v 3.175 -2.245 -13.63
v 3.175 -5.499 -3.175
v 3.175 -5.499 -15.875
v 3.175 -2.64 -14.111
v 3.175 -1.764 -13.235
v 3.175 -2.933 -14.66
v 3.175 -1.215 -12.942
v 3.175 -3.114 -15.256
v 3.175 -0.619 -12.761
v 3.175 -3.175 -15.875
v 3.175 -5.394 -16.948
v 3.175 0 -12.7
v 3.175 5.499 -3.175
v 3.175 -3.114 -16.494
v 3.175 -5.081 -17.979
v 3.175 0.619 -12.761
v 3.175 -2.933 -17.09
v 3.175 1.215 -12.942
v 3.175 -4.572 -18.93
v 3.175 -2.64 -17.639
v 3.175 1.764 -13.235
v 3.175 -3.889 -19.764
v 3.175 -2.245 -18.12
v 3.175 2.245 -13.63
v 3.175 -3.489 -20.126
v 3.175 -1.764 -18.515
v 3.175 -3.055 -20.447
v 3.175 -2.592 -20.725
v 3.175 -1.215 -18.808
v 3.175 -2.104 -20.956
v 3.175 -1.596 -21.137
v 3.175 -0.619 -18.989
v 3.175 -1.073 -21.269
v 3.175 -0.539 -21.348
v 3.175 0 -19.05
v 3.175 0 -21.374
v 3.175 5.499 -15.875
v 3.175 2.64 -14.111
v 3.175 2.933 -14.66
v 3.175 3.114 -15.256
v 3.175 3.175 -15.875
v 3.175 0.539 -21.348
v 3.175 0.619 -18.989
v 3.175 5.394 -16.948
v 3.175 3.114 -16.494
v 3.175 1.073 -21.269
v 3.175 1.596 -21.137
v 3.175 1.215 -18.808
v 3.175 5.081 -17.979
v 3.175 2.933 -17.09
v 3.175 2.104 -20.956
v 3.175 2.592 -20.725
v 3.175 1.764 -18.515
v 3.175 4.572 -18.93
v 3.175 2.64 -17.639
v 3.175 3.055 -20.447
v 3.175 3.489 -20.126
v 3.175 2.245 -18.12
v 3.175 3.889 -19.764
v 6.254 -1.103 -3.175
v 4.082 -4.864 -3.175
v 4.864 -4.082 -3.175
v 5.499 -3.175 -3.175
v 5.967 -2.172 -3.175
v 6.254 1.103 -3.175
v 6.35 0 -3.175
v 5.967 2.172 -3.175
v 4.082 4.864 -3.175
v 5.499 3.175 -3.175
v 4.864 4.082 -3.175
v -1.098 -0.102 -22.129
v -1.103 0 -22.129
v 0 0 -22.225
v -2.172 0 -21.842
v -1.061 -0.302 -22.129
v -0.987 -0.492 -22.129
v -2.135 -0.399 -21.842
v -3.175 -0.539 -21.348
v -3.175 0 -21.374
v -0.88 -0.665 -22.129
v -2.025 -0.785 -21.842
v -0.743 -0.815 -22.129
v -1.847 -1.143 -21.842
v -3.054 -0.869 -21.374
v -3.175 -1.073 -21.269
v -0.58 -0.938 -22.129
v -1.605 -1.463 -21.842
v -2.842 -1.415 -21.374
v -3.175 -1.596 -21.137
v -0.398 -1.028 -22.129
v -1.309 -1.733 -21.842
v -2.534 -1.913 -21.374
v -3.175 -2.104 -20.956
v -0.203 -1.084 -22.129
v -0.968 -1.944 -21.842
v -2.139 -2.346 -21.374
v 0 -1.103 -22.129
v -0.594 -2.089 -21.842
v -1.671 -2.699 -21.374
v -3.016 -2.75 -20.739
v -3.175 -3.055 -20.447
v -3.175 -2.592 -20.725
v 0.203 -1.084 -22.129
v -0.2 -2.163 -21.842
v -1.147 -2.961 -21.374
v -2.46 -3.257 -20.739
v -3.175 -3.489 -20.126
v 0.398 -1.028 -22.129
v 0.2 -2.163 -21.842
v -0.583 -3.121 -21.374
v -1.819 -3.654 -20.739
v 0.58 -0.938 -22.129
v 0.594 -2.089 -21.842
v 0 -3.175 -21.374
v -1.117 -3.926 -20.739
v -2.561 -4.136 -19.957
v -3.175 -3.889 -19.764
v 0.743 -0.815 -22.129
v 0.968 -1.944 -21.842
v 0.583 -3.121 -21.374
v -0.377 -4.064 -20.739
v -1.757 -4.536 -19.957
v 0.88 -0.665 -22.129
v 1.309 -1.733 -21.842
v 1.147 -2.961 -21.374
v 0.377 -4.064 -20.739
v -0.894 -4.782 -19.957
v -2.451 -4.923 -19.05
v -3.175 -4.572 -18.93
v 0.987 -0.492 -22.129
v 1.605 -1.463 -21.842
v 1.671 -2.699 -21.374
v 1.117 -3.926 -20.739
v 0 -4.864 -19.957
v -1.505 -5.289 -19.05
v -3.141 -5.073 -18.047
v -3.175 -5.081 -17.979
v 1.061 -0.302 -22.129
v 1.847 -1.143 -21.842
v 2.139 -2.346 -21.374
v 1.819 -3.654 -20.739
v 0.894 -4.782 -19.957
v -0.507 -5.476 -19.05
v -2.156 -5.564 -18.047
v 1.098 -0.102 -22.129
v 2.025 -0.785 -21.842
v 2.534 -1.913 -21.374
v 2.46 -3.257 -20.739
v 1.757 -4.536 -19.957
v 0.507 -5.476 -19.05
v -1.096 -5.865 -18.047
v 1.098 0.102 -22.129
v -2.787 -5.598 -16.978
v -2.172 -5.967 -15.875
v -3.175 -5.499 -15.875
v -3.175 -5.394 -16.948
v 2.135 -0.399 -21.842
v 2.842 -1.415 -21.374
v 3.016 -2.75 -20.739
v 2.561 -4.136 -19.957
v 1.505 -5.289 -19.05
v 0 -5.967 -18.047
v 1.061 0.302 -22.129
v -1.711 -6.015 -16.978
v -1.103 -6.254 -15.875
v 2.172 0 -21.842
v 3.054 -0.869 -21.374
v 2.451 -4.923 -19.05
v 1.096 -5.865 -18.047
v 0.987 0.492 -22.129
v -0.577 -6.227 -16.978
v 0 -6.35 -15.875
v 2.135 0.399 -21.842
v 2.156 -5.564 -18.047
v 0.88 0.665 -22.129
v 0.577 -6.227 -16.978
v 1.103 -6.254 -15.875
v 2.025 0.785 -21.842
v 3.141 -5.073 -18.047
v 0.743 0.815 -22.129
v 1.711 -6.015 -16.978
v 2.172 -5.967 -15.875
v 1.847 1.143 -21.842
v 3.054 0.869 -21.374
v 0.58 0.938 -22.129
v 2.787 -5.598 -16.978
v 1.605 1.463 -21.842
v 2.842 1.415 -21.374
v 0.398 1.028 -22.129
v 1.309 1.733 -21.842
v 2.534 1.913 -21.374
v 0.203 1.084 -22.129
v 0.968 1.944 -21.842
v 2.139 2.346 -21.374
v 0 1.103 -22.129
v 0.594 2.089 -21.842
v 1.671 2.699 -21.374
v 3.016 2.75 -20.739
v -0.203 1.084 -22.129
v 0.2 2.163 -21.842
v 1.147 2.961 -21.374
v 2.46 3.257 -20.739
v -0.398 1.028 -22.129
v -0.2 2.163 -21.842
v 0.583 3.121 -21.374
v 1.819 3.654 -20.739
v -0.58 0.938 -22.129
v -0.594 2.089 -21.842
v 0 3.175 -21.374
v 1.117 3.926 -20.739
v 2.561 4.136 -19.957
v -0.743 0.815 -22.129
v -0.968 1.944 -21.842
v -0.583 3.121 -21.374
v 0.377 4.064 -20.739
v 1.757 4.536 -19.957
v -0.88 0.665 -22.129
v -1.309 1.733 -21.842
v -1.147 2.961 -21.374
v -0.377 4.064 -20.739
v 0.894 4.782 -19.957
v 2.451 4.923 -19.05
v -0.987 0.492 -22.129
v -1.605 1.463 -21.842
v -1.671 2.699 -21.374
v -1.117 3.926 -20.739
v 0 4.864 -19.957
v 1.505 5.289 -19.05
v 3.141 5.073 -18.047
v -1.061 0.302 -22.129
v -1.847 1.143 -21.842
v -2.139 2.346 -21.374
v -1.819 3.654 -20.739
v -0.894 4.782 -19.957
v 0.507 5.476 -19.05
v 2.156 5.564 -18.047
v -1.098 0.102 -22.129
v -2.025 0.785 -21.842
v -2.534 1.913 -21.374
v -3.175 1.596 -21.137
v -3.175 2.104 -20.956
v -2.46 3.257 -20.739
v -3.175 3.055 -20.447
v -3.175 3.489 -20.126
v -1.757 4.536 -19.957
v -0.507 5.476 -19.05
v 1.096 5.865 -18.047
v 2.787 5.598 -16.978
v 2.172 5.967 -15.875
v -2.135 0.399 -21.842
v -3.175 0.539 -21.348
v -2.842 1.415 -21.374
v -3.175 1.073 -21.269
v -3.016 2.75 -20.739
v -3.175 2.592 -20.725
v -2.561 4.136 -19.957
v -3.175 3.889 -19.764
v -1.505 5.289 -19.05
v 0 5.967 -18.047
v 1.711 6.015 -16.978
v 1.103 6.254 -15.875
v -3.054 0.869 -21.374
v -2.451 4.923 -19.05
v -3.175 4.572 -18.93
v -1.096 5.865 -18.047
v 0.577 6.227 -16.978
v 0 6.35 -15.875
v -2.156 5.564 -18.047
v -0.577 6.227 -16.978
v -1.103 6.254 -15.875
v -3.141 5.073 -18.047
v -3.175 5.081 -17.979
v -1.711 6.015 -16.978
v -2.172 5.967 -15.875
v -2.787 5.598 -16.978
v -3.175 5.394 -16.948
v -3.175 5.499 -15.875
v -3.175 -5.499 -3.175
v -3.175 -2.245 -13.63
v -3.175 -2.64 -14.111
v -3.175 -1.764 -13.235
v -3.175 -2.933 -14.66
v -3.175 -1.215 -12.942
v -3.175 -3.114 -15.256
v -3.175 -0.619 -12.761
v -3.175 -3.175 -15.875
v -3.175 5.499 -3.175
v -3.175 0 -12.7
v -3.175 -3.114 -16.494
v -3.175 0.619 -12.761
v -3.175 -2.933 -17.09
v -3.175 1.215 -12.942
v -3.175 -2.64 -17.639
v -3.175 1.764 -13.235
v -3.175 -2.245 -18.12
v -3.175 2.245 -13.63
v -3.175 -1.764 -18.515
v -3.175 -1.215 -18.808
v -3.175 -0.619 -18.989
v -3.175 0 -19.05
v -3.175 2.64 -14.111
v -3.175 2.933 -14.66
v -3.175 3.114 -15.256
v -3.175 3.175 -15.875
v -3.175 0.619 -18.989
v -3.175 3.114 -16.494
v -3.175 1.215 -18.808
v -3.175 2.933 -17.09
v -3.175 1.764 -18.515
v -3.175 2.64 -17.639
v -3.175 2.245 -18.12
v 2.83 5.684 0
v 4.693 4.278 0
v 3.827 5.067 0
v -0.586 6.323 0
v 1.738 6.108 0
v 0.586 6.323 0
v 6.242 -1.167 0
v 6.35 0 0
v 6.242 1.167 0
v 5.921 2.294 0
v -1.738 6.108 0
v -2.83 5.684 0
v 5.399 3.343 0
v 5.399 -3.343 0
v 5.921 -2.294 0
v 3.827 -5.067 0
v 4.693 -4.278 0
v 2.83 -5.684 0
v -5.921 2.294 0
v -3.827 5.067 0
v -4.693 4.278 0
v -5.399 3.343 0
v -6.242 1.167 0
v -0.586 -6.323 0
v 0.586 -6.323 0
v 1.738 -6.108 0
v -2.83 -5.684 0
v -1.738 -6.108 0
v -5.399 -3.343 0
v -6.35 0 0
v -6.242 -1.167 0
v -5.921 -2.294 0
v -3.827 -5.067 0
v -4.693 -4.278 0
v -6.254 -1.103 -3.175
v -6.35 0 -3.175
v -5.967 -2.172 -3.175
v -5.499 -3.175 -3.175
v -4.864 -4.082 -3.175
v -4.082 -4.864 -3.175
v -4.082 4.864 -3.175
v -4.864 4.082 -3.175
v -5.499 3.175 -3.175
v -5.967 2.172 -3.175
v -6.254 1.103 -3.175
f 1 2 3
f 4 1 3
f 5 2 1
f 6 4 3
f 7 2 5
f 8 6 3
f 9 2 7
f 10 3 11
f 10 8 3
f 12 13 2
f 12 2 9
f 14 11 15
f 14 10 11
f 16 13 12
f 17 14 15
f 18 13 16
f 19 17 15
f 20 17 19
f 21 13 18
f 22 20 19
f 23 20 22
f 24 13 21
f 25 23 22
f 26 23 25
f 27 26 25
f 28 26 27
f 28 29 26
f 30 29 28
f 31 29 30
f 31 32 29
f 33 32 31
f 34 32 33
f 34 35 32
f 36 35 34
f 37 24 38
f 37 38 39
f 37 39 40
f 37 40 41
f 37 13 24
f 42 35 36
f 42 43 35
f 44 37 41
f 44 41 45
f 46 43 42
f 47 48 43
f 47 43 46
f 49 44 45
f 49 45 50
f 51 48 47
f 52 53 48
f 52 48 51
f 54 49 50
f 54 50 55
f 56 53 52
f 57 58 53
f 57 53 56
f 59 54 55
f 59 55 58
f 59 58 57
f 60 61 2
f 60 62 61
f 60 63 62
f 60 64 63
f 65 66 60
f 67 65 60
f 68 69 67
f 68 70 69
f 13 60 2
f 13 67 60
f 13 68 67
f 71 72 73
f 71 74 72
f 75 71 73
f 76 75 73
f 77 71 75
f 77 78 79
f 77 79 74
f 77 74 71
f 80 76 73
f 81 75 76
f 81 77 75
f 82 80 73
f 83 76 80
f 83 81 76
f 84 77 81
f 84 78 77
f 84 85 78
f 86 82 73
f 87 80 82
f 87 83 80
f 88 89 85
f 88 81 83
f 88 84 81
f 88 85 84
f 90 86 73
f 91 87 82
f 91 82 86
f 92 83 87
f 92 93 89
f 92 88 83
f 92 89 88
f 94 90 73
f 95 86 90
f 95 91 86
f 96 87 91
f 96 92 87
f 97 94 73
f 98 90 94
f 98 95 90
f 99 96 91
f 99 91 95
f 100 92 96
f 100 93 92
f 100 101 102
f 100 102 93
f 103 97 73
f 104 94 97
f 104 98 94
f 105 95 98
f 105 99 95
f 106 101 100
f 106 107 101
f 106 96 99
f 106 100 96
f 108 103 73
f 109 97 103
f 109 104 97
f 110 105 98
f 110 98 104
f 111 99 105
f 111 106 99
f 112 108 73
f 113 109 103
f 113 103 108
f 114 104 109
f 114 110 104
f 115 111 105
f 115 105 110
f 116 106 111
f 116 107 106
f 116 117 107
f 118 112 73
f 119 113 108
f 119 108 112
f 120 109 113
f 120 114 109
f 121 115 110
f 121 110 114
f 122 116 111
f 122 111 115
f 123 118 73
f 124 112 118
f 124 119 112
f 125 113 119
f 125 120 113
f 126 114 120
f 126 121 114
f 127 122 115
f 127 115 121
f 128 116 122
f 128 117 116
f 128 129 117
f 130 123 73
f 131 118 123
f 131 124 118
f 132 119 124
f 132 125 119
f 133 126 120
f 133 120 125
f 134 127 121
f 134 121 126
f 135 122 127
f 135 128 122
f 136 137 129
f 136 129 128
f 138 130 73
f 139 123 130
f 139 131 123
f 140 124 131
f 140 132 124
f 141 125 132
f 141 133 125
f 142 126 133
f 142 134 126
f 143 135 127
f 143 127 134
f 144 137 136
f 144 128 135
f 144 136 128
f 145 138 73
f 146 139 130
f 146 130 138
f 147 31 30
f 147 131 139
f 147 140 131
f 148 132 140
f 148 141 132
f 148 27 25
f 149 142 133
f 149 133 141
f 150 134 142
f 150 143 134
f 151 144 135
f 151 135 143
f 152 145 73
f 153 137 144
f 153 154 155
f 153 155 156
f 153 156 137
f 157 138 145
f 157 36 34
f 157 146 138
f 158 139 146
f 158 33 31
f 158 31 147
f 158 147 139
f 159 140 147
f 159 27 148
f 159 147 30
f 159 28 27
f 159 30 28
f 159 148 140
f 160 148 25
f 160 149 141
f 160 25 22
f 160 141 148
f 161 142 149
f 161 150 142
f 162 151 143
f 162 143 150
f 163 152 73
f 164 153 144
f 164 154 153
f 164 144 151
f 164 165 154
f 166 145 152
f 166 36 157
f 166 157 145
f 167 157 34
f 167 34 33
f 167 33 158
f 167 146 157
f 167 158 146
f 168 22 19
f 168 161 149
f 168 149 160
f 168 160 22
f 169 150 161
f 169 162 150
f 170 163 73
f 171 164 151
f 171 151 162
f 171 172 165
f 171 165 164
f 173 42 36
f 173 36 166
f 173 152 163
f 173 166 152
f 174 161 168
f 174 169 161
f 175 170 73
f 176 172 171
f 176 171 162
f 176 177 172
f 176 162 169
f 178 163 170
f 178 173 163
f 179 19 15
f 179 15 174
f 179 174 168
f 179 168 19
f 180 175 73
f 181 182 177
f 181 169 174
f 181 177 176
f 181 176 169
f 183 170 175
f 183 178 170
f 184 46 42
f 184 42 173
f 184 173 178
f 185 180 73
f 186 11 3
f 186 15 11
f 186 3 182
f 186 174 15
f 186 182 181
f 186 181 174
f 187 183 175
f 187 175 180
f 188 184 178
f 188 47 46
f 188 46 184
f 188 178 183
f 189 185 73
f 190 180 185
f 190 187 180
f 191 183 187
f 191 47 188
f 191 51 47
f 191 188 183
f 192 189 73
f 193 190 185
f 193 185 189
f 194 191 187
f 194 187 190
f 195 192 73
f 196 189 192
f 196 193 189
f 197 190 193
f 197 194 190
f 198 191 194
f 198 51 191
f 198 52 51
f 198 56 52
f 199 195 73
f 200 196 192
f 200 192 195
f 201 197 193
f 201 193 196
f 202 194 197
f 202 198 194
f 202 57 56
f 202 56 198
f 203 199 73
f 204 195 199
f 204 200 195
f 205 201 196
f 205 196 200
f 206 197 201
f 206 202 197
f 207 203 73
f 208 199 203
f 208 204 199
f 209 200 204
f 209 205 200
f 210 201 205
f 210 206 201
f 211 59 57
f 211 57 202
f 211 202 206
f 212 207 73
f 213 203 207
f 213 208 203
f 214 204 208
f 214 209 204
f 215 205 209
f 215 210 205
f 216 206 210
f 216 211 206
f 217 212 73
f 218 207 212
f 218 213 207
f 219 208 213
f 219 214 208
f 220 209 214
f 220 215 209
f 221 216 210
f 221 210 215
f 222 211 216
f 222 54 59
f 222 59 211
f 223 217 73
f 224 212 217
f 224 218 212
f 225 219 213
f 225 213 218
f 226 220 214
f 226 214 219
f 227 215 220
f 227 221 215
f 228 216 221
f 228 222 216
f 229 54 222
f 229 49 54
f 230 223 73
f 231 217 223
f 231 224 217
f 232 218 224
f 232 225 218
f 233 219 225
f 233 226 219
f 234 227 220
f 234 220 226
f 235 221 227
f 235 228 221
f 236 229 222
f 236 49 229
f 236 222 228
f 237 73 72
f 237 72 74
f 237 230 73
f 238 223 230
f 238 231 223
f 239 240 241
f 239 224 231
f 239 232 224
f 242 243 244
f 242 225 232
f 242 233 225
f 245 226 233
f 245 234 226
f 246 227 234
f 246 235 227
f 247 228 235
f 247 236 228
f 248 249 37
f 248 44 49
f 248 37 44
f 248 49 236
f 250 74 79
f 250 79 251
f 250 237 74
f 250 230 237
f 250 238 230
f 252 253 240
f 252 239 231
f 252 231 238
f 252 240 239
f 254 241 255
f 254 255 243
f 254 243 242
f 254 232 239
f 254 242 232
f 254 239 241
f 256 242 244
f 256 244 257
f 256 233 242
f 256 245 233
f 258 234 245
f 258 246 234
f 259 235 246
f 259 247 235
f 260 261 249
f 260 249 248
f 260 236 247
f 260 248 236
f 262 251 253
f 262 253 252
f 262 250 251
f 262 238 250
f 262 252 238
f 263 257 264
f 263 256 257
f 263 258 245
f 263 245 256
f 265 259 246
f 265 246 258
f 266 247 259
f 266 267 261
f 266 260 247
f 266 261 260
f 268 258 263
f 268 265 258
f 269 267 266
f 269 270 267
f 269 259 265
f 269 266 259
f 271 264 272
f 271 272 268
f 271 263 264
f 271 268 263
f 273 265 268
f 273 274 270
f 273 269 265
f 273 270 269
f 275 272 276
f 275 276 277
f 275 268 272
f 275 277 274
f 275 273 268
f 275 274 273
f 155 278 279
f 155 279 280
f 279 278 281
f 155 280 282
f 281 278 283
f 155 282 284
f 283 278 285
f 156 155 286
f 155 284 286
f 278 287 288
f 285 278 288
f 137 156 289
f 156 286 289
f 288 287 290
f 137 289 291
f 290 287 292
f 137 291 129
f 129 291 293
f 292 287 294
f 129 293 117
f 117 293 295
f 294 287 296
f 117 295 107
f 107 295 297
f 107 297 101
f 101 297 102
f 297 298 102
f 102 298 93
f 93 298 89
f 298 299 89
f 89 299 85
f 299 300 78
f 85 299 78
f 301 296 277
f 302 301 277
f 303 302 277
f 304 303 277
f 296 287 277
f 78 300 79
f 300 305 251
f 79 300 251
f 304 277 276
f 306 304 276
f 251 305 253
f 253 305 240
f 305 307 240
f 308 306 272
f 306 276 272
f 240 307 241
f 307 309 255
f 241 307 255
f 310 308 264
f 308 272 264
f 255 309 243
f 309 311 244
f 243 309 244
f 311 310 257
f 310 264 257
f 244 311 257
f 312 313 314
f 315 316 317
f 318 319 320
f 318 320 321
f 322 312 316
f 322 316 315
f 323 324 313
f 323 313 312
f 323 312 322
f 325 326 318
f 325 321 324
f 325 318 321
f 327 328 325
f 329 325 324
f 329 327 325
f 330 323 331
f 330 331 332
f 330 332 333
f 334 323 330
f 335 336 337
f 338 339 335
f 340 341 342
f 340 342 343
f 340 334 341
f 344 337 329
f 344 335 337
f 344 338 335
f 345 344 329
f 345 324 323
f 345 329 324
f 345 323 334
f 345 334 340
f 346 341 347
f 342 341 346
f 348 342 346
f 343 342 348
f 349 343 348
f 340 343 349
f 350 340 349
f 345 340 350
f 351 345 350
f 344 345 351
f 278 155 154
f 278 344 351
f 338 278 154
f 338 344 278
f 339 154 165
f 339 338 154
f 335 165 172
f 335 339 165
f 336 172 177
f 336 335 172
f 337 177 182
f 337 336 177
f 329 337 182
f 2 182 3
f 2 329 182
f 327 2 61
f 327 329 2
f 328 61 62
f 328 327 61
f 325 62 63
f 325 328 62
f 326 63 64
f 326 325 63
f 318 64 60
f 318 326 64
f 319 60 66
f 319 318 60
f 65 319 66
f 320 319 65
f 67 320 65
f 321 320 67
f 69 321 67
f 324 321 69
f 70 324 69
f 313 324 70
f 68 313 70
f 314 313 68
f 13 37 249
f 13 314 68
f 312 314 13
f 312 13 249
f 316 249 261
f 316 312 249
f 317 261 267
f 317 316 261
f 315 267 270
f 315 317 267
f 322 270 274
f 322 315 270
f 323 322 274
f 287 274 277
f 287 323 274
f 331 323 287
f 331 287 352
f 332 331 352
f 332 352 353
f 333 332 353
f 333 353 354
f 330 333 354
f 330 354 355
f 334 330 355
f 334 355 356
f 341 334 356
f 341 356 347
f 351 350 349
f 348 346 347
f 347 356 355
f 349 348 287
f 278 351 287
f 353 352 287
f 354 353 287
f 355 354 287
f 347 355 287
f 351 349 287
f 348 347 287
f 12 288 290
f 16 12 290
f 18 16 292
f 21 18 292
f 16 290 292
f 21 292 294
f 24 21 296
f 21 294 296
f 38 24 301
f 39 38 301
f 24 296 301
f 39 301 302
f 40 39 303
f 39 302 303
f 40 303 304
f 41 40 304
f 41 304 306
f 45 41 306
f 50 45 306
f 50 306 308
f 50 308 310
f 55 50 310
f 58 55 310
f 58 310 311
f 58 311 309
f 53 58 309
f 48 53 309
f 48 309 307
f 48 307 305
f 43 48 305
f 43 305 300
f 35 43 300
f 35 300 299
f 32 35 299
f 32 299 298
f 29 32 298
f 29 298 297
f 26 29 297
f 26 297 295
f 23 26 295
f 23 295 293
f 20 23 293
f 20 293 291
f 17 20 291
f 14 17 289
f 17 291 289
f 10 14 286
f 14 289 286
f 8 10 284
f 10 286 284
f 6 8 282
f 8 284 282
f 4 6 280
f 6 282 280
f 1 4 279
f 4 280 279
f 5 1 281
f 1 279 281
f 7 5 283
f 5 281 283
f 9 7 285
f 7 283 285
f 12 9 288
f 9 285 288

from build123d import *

# Parameters (mm, degrees)
SKETCH2_W          = 12.7
SKETCH2_H          = 60.004179461
CUT_EXTRUDE1_DEPTH = 24.970724332
SKETCH3_R          = 3.175
CUT_EXTRUDE2_DEPTH = 25.999975


with BuildPart() as part:
    # Sketch1 → Revolve1 (revolve)
    with BuildSketch(Plane(origin=(0, 0, 0), x_dir=(1, 0, 0), z_dir=(0, 1, 0)), mode=Mode.PRIVATE) as revolve1_sk:
        with BuildLine():
            Line((0, 0), (0, 15.875))
            Line((0, 15.875), (0, 22.225))
            ThreePointArc((0, 22.225), (4.490128061, 20.365128061), (6.35, 15.875))
            Line((6.35, 15.875), (6.35, 0))
            Line((6.35, 0), (0, 0))
        make_face()
    revolve(revolve1_sk.sketch.rotate(Axis((0, 0, -22.225), (0, 0, 1)), 180), axis=Axis((0, 0, -22.225), (0, 0, 1)))

    # Sketch2 → Cut-Extrude1 (cut, symmetric)
    with BuildSketch(Plane(origin=(0, 0, 0), x_dir=(1, 0, 0), z_dir=(0, 1, 0))):
        with Locations((-9.525, 33.177089731)):
            Rectangle(SKETCH2_W, SKETCH2_H)
    cut_extrude1 = extrude(amount=CUT_EXTRUDE1_DEPTH, both=True, mode=Mode.SUBTRACT)

    # Mirror1: Cut-Extrude1 across plane
    add(cut_extrude1.mirror(Plane(origin=(0, 0, 0), x_dir=(0, 0, 1), z_dir=(1, 0, 0))), mode=Mode.SUBTRACT)

    # Sketch3 → Cut-Extrude2 (cut, through all)
    with BuildSketch(Plane.ZY.offset(3.175)):
        with Locations((-15.875, 0)):
            Circle(SKETCH3_R)
    extrude(amount=-CUT_EXTRUDE2_DEPTH, mode=Mode.SUBTRACT)


solid = part.part
